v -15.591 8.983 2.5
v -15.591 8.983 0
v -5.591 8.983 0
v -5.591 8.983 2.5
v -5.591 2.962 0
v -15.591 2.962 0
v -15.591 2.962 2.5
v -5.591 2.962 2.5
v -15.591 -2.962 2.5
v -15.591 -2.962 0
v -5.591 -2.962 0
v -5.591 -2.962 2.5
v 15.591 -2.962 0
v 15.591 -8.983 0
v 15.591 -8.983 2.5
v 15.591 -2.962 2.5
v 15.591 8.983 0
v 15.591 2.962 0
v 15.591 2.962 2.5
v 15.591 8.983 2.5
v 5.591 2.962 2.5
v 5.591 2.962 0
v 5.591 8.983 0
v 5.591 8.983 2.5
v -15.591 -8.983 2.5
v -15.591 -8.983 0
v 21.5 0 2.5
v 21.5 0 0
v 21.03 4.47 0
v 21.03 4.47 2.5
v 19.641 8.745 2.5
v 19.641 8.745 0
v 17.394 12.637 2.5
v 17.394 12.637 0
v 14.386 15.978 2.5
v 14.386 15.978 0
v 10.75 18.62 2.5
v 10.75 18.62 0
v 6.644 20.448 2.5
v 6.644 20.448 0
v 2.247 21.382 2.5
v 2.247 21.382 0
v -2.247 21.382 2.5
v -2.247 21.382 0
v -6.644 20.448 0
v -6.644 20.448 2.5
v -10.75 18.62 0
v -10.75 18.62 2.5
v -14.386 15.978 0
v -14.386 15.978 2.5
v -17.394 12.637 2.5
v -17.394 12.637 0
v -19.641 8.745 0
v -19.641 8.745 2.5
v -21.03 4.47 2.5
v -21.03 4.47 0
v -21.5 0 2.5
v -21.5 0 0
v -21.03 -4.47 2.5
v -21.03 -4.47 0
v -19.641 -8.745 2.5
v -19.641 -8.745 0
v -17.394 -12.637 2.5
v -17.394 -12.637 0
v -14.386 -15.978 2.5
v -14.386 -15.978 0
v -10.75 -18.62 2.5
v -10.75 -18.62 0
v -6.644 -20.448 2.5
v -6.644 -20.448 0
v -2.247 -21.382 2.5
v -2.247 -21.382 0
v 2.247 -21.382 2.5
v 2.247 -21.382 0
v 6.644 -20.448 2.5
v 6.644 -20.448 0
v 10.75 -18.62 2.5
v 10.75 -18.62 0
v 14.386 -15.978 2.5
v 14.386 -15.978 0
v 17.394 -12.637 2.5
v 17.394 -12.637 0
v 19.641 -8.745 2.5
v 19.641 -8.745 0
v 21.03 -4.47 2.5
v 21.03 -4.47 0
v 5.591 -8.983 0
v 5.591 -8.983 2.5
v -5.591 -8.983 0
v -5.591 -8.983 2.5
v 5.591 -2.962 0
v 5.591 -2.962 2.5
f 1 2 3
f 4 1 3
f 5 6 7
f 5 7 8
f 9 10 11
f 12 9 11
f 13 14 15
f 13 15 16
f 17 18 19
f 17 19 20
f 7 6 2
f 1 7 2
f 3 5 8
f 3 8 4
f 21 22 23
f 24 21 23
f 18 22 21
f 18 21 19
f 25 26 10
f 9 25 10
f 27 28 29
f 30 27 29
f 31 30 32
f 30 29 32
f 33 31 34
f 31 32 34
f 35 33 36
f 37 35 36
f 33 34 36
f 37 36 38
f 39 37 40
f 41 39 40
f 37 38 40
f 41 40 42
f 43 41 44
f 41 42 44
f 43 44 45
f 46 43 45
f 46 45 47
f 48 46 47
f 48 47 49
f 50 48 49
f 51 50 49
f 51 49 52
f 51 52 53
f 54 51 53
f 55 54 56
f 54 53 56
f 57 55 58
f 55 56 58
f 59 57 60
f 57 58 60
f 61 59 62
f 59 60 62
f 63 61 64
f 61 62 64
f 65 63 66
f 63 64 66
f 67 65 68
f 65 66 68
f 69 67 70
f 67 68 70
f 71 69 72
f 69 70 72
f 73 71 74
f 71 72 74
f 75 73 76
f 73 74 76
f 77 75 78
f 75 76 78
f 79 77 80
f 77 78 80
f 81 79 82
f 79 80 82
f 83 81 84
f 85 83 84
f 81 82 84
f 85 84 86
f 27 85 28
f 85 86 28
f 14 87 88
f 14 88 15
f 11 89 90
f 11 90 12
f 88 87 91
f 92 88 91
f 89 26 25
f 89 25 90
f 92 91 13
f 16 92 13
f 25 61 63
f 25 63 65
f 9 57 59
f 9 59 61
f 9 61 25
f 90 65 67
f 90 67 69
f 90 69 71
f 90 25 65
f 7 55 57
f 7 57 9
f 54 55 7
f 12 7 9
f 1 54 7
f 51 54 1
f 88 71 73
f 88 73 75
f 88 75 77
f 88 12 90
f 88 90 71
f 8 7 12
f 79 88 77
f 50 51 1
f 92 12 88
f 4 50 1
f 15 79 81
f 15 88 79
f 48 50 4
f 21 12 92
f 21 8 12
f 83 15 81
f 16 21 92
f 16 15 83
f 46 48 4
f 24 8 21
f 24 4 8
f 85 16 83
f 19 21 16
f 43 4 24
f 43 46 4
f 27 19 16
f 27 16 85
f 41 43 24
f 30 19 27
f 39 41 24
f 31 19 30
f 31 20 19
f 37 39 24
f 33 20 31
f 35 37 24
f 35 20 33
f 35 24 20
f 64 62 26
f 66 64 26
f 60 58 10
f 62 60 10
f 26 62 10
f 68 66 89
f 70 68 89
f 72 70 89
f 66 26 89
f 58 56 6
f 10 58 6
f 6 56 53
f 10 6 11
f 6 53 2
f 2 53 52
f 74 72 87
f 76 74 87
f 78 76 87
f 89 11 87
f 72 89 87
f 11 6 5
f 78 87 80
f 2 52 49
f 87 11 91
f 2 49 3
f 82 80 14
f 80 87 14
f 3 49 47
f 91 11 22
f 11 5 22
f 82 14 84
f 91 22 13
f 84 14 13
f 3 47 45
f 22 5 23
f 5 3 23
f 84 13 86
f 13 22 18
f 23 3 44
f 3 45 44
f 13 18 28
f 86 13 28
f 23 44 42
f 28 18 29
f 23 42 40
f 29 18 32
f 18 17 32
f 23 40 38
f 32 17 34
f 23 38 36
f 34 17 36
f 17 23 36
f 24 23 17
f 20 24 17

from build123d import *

# Parameters (mm, degrees)
F0_R     = 21.5
F0_W     = 10
F0_H     = 6.020403
F1_DEPTH = 2.5


with BuildPart() as f1:
    # F0 (on Top) → F1 (new body)
    with BuildSketch(Plane.XY):
        Circle(F0_R)
        with Locations((-10.591081, -5.972431)):
            Rectangle(F0_W, F0_H, mode=Mode.SUBTRACT)
        with Locations((10.591081, -5.972431)):
            Rectangle(F0_W, F0_H, mode=Mode.SUBTRACT)
        with Locations((-10.591081, 5.972431)):
            Rectangle(F0_W, F0_H, mode=Mode.SUBTRACT)
        with Locations((10.591081, 5.972431)):
            Rectangle(F0_W, F0_H, mode=Mode.SUBTRACT)
    extrude(amount=F1_DEPTH)


solid = f1.part
